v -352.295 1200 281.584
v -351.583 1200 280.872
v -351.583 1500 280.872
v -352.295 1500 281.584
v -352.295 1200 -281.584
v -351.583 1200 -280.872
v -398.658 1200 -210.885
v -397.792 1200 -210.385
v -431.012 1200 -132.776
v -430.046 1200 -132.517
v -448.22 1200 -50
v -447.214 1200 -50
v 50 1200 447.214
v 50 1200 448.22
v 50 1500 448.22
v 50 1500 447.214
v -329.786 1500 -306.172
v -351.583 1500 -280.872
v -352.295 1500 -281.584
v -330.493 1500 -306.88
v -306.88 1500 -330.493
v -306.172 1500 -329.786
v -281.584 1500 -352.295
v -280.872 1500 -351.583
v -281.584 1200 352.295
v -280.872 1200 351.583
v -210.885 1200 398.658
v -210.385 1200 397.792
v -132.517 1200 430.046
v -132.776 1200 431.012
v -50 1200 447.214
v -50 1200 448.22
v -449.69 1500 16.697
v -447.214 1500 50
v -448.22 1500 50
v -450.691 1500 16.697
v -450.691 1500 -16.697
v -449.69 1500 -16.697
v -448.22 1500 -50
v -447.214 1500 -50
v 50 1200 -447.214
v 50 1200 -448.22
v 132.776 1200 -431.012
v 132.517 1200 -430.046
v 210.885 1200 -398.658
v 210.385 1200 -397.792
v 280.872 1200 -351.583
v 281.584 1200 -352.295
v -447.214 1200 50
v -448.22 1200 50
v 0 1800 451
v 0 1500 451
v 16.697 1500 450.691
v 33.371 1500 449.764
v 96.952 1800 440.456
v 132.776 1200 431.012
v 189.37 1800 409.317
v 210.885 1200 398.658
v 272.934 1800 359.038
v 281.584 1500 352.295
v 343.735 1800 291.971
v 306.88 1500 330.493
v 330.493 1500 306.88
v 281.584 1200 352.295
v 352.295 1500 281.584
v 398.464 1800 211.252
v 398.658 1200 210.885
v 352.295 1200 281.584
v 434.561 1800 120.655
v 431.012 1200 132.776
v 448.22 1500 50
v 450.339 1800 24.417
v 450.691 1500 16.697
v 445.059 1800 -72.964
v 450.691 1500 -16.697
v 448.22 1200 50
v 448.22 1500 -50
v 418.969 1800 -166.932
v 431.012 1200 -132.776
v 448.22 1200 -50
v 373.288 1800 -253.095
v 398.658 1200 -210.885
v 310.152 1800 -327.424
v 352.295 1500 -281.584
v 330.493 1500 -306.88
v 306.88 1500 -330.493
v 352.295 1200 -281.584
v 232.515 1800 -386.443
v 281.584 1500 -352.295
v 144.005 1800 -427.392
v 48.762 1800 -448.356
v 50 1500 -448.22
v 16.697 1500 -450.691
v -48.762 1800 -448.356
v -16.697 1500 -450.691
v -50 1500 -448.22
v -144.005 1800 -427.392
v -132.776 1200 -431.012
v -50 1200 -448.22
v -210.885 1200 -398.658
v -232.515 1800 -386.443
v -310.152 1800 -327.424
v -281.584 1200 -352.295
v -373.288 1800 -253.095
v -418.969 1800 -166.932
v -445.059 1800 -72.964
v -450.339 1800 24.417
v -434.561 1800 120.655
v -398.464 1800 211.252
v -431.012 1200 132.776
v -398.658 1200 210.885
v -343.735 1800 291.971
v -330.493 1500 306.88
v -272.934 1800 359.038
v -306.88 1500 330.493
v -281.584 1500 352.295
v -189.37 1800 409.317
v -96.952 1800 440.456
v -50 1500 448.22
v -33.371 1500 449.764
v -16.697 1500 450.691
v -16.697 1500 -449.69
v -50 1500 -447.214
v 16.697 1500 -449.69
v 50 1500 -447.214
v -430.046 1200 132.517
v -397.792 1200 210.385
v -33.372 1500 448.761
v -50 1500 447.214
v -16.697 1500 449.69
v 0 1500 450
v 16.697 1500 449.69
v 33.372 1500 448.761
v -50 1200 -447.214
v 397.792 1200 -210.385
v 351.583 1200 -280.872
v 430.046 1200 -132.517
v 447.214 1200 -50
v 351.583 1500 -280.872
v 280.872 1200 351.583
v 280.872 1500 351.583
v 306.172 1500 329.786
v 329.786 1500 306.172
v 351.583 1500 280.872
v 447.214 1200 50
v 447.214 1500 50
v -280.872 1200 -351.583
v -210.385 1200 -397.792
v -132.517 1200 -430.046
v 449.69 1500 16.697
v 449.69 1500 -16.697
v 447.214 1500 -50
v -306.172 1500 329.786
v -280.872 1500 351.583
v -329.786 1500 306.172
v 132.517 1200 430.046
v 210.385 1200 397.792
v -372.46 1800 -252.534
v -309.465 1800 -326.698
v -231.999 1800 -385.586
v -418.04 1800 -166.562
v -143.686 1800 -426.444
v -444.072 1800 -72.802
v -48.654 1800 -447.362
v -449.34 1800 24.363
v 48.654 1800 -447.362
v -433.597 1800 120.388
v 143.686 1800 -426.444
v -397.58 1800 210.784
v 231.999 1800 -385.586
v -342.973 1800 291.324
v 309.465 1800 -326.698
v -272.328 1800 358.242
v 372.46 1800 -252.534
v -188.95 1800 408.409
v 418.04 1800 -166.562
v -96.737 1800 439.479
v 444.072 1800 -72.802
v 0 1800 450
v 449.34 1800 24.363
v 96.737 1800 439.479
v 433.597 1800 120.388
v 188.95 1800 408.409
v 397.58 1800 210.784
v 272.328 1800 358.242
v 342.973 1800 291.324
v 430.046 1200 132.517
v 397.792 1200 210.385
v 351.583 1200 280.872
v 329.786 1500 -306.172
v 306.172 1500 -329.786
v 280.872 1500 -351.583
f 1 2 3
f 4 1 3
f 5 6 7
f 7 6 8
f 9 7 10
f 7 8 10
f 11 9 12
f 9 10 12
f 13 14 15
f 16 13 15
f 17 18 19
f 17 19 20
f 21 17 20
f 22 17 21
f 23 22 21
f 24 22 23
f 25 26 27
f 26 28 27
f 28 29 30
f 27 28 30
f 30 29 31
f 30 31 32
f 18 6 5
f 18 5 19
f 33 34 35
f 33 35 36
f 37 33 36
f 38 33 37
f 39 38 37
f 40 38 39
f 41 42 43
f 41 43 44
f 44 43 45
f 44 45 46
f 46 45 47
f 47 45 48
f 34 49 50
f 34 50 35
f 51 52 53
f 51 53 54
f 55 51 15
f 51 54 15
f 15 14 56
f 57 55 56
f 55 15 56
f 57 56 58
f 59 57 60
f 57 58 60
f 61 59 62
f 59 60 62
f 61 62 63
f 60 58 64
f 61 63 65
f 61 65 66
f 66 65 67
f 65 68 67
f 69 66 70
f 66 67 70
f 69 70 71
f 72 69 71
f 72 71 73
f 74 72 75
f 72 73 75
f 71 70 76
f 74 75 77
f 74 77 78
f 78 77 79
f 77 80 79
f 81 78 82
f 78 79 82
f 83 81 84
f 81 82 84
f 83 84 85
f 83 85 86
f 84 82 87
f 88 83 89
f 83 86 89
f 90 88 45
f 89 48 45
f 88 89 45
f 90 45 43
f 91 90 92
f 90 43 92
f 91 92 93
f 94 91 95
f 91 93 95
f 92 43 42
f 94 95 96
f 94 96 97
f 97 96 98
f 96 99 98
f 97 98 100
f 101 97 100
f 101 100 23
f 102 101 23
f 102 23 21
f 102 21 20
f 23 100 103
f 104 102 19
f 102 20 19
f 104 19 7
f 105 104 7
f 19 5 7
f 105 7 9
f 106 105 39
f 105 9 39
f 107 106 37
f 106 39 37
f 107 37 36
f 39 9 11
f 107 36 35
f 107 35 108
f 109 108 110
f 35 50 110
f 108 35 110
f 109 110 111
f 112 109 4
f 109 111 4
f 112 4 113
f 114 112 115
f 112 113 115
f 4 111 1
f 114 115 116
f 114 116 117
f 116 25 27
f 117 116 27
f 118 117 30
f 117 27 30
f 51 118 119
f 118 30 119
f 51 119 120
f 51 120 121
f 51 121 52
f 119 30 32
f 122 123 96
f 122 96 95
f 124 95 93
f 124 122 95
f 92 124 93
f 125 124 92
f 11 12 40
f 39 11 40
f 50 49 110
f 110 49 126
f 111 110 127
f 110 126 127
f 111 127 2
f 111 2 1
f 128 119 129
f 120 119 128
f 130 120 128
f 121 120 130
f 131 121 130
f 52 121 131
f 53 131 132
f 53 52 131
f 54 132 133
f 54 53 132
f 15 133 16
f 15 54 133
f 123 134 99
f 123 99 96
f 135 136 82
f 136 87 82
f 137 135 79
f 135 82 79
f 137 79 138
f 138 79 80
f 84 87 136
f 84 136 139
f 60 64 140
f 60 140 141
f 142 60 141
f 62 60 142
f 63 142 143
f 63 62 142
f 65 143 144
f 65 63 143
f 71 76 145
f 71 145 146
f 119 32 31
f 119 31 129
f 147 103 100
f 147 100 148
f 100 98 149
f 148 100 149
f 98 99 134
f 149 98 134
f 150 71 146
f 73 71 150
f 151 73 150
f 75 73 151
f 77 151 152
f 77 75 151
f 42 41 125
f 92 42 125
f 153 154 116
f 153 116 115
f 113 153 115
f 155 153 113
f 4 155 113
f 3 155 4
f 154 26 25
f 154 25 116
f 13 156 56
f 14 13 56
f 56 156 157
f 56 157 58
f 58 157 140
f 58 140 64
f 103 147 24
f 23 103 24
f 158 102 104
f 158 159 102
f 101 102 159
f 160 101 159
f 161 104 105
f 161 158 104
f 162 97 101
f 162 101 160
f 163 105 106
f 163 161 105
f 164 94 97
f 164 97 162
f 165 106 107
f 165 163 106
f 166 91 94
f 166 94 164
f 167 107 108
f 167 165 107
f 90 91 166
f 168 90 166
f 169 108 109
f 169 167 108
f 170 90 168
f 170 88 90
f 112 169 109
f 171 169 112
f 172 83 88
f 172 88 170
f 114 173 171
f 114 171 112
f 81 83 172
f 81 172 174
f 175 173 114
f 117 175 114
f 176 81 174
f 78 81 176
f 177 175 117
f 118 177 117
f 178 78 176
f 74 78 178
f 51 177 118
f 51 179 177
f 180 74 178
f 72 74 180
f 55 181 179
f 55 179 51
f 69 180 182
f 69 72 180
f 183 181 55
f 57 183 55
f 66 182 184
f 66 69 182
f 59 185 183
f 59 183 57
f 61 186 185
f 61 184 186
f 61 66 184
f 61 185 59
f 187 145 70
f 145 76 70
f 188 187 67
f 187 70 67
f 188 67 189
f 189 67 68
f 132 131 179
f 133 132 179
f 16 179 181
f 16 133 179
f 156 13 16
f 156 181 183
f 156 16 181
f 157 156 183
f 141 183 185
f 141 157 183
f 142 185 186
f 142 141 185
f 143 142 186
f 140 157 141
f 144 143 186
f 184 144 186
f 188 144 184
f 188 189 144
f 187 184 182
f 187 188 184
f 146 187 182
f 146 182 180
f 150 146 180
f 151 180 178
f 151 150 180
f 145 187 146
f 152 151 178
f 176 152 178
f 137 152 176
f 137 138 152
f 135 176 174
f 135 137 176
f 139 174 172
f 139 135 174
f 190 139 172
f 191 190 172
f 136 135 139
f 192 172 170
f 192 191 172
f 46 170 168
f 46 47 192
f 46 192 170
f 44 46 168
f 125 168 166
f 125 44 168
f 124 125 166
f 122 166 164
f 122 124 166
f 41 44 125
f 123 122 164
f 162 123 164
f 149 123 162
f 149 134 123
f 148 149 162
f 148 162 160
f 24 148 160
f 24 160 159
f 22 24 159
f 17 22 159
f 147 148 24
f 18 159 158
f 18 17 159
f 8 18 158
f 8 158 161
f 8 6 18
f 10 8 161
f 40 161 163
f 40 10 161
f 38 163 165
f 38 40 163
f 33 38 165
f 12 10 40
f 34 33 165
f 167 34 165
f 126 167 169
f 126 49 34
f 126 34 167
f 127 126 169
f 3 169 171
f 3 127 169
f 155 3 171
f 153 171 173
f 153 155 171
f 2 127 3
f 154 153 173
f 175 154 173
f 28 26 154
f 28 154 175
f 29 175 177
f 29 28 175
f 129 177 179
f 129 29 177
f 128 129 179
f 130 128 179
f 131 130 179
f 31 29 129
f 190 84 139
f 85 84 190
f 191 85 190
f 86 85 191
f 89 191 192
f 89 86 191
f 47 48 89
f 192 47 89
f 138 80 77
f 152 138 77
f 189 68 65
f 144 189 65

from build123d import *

# Parameters (mm, degrees)
SKETCH1_R           = 451
SKETCH1_R_2         = 450
BOSS_EXTRUDE1_DEPTH = 600
SKETCH10_W          = 100
SKETCH10_H          = 300
CUT_EXTRUDE1_DEPTH  = 1910.660179194
CIRPATTERN1_COUNT   = 4
CIRPATTERN1_ANGLE   = 135


with BuildPart() as part:
    # Sketch1 → Boss-Extrude1 (new body)
    with BuildSketch(Plane(origin=(0, 1200, 0), x_dir=(1, 0, 0), z_dir=(0, 1, 0))):
        Circle(SKETCH1_R)
        Circle(SKETCH1_R_2, mode=Mode.SUBTRACT)
    extrude(amount=BOSS_EXTRUDE1_DEPTH)

    # Sketch10 → Cut-Extrude1 (cut, symmetric)
    with BuildSketch(Plane.XY):
        with Locations((0, 1350)):
            Rectangle(SKETCH10_W, SKETCH10_H)
    cut_extrude1 = extrude(amount=CUT_EXTRUDE1_DEPTH, both=True, mode=Mode.SUBTRACT)

    # CirPattern1: Cut-Extrude1 ×4 about axis
    cirpattern1_axis = Axis((0, 1167.8, 0), (0, 1, 0))
    for i in range(1, CIRPATTERN1_COUNT):
        add(cut_extrude1.rotate(cirpattern1_axis, i * CIRPATTERN1_ANGLE / (CIRPATTERN1_COUNT - 1)), mode=Mode.SUBTRACT)


solid = part.part
